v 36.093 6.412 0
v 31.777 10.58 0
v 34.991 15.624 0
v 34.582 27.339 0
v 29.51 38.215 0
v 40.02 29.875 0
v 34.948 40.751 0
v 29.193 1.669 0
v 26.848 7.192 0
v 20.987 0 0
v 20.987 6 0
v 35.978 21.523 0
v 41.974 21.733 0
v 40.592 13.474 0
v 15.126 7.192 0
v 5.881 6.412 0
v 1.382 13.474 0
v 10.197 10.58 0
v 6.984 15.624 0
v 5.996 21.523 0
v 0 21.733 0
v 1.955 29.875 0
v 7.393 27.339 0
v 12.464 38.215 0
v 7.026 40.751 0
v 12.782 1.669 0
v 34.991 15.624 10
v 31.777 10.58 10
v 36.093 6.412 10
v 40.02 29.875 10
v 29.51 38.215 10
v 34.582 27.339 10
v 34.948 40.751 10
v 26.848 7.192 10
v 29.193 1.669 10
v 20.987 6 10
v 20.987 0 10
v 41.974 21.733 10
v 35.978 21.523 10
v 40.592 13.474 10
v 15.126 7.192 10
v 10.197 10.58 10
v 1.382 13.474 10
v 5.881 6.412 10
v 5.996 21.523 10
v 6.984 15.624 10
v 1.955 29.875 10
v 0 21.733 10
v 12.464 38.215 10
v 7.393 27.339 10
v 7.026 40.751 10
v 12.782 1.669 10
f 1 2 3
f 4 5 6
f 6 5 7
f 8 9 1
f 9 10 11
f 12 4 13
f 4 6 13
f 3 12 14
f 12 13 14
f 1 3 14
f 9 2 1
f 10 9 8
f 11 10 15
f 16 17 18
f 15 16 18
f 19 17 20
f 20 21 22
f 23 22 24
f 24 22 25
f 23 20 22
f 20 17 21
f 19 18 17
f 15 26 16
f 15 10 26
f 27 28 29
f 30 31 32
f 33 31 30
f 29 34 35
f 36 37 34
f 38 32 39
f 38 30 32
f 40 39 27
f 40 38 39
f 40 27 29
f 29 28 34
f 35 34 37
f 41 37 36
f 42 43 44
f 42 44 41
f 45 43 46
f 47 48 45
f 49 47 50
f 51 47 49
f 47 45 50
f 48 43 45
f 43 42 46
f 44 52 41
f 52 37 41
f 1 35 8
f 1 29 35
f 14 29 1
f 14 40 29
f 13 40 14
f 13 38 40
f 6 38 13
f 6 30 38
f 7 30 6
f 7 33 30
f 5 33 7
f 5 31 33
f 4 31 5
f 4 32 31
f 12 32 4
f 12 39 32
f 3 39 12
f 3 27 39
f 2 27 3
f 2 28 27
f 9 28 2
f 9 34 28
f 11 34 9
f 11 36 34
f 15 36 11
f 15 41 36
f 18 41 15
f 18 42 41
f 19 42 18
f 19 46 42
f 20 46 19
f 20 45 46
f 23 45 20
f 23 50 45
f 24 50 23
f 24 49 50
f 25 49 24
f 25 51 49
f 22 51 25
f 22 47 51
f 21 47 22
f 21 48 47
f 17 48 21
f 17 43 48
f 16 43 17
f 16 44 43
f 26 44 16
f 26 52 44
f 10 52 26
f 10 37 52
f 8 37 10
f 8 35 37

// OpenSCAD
$fn = 32;

// ----------------------------------------------------------------------
// Clip blank: omega clip, 10 mm thick
// ----------------------------------------------------------------------

// --- parameters (mm) ---
profile_height = 10;      // extrusion height
profile_points = 26;      // points of the closed outline

profile = [[1.955, 29.875], [0, 21.733], [1.382, 13.474], [5.881, 6.412], [12.782, 1.669], [20.987, 0], [29.193, 1.669], [36.093, 6.412], [40.592, 13.474], [41.974, 21.733], [40.02, 29.875], [34.948, 40.751], [29.51, 38.215], [34.582, 27.339], [35.978, 21.523], [34.991, 15.624], [31.777, 10.58], [26.848, 7.192], [20.987, 6], [15.126, 7.192], [10.197, 10.58], [6.984, 15.624], [5.996, 21.523], [7.393, 27.339], [12.464, 38.215], [7.026, 40.751]];  // single closed polygon, 26 points, counter clockwise

// --- the one profile operation ---
linear_extrude(height = profile_height) polygon(points = profile);
